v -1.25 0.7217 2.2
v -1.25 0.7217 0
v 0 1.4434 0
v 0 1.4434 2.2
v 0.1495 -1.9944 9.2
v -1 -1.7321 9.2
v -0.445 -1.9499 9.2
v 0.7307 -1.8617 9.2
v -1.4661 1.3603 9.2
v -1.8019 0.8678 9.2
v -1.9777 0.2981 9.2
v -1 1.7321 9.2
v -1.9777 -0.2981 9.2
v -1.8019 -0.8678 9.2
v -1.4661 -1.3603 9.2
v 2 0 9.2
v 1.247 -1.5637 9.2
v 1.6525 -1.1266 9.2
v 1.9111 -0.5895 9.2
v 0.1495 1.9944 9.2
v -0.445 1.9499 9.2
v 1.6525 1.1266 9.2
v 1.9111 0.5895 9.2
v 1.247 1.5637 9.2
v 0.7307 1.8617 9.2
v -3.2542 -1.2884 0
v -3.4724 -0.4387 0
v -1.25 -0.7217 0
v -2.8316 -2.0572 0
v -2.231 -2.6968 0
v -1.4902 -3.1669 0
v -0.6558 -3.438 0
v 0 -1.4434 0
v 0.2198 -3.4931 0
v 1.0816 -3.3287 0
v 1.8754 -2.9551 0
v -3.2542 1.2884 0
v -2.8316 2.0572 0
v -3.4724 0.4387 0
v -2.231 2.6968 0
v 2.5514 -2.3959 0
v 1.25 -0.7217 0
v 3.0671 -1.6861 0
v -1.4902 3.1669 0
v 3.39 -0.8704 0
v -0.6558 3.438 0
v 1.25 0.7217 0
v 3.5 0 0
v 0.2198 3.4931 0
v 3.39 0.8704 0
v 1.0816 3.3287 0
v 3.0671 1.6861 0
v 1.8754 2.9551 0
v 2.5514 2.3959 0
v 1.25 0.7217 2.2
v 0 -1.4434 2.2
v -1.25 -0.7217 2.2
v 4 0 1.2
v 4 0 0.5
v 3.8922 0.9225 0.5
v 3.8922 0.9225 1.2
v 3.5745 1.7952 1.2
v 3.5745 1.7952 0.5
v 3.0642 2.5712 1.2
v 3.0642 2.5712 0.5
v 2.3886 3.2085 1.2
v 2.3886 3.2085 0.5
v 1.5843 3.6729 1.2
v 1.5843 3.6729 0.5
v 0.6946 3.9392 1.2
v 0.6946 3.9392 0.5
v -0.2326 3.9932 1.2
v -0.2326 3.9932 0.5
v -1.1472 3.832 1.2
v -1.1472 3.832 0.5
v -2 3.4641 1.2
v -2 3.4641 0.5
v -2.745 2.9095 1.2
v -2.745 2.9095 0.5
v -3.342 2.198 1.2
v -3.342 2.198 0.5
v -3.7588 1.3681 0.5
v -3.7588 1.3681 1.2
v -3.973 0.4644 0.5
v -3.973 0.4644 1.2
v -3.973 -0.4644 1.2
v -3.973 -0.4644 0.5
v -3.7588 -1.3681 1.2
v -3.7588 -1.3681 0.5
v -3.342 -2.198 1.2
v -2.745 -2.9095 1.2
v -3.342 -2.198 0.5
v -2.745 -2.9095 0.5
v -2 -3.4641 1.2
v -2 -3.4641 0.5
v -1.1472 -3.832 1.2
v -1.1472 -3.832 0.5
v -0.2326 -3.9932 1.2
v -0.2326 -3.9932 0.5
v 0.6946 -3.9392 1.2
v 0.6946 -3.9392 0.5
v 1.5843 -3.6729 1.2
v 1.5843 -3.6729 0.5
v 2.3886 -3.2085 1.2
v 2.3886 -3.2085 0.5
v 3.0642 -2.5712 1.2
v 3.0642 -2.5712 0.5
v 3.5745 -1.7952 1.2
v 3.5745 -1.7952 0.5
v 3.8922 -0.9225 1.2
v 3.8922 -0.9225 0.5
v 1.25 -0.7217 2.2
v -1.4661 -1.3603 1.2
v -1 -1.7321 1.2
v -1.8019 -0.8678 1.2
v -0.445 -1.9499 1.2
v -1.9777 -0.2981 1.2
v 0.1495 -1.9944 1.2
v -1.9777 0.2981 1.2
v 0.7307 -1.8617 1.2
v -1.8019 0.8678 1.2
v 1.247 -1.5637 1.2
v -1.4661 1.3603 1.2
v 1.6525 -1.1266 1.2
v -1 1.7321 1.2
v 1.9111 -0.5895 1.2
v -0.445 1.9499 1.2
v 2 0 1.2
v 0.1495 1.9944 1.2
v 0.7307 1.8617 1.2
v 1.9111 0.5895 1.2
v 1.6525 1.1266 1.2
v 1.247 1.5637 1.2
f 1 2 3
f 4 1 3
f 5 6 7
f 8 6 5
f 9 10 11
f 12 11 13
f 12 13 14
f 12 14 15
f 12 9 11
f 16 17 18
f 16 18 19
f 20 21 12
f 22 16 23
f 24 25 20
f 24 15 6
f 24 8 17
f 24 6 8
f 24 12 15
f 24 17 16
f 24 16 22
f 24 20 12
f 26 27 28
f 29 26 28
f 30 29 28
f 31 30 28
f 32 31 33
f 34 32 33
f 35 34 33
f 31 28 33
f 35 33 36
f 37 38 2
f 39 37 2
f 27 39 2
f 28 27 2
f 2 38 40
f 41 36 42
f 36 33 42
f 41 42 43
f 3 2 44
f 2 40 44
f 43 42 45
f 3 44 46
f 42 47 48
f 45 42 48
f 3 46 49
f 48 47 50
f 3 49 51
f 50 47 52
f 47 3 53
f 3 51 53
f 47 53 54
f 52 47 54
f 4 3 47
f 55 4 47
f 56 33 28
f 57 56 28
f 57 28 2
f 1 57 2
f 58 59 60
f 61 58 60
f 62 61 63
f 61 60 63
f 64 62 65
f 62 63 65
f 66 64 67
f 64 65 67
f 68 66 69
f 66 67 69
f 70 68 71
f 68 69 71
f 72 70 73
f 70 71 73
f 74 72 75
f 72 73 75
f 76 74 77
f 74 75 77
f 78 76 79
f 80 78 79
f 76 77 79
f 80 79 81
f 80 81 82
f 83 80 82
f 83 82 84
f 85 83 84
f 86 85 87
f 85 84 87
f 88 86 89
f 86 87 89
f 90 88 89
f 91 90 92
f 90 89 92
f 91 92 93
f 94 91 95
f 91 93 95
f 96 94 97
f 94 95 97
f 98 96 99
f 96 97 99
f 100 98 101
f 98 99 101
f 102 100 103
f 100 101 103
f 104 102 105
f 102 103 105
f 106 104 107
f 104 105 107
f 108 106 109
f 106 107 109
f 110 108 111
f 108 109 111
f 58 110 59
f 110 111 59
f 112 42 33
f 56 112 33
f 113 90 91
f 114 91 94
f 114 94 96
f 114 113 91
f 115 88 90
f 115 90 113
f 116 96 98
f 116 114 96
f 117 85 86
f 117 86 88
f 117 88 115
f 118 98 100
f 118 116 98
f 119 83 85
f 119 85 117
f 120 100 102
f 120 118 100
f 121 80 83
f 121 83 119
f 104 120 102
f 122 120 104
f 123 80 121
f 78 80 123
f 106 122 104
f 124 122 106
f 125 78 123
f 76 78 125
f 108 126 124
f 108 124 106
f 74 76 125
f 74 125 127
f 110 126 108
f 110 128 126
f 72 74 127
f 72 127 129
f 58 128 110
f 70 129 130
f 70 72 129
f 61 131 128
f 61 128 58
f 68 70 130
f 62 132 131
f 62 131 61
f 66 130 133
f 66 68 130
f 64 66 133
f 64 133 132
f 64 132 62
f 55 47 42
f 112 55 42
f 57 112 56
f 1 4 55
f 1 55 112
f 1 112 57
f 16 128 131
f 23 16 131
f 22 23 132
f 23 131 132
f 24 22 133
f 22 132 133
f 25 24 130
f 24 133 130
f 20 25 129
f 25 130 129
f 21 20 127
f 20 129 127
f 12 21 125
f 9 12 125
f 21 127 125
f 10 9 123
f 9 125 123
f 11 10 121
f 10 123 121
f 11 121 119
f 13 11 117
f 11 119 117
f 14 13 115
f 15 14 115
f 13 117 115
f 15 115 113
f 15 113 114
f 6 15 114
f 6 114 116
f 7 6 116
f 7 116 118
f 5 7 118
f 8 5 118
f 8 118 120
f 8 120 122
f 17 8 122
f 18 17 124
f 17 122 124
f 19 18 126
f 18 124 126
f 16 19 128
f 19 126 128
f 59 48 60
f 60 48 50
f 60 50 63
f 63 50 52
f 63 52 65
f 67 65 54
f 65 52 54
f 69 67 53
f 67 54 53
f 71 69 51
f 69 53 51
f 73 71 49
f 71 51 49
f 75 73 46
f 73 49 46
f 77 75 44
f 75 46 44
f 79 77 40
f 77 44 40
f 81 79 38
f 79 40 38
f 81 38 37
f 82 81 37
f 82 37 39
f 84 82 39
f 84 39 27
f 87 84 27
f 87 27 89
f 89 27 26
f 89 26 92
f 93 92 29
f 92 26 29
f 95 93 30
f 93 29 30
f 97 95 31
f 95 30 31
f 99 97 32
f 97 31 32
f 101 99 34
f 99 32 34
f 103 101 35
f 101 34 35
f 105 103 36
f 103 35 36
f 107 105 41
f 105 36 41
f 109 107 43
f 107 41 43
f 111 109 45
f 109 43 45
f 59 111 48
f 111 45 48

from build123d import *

# Parameters (mm, degrees)
SKETCH_1_R          = 4
EXTRUDE_1_DEPTH     = 1.2
CHAMFER_1_SIZE      = 0.5
SKETCH_3_R          = 2
EXTRUDE_2_DEPTH     = 8
CUT_EXTRUDE_1_DEPTH = 2.2


with BuildPart() as part:
    # 草图1 → 凸台-拉伸1 (new body)
    with BuildSketch(Plane.XY):
        Circle(SKETCH_1_R)
    extrude(amount=EXTRUDE_1_DEPTH)

    # 倒角1
    chamfer_1_edges = [part.edges().sort_by_distance(p)[0] for p in [
        (-4, 0, 0),
    ]]
    chamfer(chamfer_1_edges, length=CHAMFER_1_SIZE)

    # 草图3 → 凸台-拉伸2 (add)
    with BuildSketch(Plane.XY.offset(1.2)):
        Circle(SKETCH_3_R)
    extrude(amount=EXTRUDE_2_DEPTH)

    # 草图4 → 切除-拉伸1 (cut)
    with BuildSketch(Plane(origin=(0, 0, 0), x_dir=(-1, 0, 0), z_dir=(0, 0, -1))):
        Polygon((0, 1.443375673), (-1.25, 0.721687836), (-1.25, -0.721687836), (0, -1.443375673), (1.25, -0.721687836), (1.25, 0.721687836), align=None)
    extrude(amount=-CUT_EXTRUDE_1_DEPTH, mode=Mode.SUBTRACT)


solid = part.part
